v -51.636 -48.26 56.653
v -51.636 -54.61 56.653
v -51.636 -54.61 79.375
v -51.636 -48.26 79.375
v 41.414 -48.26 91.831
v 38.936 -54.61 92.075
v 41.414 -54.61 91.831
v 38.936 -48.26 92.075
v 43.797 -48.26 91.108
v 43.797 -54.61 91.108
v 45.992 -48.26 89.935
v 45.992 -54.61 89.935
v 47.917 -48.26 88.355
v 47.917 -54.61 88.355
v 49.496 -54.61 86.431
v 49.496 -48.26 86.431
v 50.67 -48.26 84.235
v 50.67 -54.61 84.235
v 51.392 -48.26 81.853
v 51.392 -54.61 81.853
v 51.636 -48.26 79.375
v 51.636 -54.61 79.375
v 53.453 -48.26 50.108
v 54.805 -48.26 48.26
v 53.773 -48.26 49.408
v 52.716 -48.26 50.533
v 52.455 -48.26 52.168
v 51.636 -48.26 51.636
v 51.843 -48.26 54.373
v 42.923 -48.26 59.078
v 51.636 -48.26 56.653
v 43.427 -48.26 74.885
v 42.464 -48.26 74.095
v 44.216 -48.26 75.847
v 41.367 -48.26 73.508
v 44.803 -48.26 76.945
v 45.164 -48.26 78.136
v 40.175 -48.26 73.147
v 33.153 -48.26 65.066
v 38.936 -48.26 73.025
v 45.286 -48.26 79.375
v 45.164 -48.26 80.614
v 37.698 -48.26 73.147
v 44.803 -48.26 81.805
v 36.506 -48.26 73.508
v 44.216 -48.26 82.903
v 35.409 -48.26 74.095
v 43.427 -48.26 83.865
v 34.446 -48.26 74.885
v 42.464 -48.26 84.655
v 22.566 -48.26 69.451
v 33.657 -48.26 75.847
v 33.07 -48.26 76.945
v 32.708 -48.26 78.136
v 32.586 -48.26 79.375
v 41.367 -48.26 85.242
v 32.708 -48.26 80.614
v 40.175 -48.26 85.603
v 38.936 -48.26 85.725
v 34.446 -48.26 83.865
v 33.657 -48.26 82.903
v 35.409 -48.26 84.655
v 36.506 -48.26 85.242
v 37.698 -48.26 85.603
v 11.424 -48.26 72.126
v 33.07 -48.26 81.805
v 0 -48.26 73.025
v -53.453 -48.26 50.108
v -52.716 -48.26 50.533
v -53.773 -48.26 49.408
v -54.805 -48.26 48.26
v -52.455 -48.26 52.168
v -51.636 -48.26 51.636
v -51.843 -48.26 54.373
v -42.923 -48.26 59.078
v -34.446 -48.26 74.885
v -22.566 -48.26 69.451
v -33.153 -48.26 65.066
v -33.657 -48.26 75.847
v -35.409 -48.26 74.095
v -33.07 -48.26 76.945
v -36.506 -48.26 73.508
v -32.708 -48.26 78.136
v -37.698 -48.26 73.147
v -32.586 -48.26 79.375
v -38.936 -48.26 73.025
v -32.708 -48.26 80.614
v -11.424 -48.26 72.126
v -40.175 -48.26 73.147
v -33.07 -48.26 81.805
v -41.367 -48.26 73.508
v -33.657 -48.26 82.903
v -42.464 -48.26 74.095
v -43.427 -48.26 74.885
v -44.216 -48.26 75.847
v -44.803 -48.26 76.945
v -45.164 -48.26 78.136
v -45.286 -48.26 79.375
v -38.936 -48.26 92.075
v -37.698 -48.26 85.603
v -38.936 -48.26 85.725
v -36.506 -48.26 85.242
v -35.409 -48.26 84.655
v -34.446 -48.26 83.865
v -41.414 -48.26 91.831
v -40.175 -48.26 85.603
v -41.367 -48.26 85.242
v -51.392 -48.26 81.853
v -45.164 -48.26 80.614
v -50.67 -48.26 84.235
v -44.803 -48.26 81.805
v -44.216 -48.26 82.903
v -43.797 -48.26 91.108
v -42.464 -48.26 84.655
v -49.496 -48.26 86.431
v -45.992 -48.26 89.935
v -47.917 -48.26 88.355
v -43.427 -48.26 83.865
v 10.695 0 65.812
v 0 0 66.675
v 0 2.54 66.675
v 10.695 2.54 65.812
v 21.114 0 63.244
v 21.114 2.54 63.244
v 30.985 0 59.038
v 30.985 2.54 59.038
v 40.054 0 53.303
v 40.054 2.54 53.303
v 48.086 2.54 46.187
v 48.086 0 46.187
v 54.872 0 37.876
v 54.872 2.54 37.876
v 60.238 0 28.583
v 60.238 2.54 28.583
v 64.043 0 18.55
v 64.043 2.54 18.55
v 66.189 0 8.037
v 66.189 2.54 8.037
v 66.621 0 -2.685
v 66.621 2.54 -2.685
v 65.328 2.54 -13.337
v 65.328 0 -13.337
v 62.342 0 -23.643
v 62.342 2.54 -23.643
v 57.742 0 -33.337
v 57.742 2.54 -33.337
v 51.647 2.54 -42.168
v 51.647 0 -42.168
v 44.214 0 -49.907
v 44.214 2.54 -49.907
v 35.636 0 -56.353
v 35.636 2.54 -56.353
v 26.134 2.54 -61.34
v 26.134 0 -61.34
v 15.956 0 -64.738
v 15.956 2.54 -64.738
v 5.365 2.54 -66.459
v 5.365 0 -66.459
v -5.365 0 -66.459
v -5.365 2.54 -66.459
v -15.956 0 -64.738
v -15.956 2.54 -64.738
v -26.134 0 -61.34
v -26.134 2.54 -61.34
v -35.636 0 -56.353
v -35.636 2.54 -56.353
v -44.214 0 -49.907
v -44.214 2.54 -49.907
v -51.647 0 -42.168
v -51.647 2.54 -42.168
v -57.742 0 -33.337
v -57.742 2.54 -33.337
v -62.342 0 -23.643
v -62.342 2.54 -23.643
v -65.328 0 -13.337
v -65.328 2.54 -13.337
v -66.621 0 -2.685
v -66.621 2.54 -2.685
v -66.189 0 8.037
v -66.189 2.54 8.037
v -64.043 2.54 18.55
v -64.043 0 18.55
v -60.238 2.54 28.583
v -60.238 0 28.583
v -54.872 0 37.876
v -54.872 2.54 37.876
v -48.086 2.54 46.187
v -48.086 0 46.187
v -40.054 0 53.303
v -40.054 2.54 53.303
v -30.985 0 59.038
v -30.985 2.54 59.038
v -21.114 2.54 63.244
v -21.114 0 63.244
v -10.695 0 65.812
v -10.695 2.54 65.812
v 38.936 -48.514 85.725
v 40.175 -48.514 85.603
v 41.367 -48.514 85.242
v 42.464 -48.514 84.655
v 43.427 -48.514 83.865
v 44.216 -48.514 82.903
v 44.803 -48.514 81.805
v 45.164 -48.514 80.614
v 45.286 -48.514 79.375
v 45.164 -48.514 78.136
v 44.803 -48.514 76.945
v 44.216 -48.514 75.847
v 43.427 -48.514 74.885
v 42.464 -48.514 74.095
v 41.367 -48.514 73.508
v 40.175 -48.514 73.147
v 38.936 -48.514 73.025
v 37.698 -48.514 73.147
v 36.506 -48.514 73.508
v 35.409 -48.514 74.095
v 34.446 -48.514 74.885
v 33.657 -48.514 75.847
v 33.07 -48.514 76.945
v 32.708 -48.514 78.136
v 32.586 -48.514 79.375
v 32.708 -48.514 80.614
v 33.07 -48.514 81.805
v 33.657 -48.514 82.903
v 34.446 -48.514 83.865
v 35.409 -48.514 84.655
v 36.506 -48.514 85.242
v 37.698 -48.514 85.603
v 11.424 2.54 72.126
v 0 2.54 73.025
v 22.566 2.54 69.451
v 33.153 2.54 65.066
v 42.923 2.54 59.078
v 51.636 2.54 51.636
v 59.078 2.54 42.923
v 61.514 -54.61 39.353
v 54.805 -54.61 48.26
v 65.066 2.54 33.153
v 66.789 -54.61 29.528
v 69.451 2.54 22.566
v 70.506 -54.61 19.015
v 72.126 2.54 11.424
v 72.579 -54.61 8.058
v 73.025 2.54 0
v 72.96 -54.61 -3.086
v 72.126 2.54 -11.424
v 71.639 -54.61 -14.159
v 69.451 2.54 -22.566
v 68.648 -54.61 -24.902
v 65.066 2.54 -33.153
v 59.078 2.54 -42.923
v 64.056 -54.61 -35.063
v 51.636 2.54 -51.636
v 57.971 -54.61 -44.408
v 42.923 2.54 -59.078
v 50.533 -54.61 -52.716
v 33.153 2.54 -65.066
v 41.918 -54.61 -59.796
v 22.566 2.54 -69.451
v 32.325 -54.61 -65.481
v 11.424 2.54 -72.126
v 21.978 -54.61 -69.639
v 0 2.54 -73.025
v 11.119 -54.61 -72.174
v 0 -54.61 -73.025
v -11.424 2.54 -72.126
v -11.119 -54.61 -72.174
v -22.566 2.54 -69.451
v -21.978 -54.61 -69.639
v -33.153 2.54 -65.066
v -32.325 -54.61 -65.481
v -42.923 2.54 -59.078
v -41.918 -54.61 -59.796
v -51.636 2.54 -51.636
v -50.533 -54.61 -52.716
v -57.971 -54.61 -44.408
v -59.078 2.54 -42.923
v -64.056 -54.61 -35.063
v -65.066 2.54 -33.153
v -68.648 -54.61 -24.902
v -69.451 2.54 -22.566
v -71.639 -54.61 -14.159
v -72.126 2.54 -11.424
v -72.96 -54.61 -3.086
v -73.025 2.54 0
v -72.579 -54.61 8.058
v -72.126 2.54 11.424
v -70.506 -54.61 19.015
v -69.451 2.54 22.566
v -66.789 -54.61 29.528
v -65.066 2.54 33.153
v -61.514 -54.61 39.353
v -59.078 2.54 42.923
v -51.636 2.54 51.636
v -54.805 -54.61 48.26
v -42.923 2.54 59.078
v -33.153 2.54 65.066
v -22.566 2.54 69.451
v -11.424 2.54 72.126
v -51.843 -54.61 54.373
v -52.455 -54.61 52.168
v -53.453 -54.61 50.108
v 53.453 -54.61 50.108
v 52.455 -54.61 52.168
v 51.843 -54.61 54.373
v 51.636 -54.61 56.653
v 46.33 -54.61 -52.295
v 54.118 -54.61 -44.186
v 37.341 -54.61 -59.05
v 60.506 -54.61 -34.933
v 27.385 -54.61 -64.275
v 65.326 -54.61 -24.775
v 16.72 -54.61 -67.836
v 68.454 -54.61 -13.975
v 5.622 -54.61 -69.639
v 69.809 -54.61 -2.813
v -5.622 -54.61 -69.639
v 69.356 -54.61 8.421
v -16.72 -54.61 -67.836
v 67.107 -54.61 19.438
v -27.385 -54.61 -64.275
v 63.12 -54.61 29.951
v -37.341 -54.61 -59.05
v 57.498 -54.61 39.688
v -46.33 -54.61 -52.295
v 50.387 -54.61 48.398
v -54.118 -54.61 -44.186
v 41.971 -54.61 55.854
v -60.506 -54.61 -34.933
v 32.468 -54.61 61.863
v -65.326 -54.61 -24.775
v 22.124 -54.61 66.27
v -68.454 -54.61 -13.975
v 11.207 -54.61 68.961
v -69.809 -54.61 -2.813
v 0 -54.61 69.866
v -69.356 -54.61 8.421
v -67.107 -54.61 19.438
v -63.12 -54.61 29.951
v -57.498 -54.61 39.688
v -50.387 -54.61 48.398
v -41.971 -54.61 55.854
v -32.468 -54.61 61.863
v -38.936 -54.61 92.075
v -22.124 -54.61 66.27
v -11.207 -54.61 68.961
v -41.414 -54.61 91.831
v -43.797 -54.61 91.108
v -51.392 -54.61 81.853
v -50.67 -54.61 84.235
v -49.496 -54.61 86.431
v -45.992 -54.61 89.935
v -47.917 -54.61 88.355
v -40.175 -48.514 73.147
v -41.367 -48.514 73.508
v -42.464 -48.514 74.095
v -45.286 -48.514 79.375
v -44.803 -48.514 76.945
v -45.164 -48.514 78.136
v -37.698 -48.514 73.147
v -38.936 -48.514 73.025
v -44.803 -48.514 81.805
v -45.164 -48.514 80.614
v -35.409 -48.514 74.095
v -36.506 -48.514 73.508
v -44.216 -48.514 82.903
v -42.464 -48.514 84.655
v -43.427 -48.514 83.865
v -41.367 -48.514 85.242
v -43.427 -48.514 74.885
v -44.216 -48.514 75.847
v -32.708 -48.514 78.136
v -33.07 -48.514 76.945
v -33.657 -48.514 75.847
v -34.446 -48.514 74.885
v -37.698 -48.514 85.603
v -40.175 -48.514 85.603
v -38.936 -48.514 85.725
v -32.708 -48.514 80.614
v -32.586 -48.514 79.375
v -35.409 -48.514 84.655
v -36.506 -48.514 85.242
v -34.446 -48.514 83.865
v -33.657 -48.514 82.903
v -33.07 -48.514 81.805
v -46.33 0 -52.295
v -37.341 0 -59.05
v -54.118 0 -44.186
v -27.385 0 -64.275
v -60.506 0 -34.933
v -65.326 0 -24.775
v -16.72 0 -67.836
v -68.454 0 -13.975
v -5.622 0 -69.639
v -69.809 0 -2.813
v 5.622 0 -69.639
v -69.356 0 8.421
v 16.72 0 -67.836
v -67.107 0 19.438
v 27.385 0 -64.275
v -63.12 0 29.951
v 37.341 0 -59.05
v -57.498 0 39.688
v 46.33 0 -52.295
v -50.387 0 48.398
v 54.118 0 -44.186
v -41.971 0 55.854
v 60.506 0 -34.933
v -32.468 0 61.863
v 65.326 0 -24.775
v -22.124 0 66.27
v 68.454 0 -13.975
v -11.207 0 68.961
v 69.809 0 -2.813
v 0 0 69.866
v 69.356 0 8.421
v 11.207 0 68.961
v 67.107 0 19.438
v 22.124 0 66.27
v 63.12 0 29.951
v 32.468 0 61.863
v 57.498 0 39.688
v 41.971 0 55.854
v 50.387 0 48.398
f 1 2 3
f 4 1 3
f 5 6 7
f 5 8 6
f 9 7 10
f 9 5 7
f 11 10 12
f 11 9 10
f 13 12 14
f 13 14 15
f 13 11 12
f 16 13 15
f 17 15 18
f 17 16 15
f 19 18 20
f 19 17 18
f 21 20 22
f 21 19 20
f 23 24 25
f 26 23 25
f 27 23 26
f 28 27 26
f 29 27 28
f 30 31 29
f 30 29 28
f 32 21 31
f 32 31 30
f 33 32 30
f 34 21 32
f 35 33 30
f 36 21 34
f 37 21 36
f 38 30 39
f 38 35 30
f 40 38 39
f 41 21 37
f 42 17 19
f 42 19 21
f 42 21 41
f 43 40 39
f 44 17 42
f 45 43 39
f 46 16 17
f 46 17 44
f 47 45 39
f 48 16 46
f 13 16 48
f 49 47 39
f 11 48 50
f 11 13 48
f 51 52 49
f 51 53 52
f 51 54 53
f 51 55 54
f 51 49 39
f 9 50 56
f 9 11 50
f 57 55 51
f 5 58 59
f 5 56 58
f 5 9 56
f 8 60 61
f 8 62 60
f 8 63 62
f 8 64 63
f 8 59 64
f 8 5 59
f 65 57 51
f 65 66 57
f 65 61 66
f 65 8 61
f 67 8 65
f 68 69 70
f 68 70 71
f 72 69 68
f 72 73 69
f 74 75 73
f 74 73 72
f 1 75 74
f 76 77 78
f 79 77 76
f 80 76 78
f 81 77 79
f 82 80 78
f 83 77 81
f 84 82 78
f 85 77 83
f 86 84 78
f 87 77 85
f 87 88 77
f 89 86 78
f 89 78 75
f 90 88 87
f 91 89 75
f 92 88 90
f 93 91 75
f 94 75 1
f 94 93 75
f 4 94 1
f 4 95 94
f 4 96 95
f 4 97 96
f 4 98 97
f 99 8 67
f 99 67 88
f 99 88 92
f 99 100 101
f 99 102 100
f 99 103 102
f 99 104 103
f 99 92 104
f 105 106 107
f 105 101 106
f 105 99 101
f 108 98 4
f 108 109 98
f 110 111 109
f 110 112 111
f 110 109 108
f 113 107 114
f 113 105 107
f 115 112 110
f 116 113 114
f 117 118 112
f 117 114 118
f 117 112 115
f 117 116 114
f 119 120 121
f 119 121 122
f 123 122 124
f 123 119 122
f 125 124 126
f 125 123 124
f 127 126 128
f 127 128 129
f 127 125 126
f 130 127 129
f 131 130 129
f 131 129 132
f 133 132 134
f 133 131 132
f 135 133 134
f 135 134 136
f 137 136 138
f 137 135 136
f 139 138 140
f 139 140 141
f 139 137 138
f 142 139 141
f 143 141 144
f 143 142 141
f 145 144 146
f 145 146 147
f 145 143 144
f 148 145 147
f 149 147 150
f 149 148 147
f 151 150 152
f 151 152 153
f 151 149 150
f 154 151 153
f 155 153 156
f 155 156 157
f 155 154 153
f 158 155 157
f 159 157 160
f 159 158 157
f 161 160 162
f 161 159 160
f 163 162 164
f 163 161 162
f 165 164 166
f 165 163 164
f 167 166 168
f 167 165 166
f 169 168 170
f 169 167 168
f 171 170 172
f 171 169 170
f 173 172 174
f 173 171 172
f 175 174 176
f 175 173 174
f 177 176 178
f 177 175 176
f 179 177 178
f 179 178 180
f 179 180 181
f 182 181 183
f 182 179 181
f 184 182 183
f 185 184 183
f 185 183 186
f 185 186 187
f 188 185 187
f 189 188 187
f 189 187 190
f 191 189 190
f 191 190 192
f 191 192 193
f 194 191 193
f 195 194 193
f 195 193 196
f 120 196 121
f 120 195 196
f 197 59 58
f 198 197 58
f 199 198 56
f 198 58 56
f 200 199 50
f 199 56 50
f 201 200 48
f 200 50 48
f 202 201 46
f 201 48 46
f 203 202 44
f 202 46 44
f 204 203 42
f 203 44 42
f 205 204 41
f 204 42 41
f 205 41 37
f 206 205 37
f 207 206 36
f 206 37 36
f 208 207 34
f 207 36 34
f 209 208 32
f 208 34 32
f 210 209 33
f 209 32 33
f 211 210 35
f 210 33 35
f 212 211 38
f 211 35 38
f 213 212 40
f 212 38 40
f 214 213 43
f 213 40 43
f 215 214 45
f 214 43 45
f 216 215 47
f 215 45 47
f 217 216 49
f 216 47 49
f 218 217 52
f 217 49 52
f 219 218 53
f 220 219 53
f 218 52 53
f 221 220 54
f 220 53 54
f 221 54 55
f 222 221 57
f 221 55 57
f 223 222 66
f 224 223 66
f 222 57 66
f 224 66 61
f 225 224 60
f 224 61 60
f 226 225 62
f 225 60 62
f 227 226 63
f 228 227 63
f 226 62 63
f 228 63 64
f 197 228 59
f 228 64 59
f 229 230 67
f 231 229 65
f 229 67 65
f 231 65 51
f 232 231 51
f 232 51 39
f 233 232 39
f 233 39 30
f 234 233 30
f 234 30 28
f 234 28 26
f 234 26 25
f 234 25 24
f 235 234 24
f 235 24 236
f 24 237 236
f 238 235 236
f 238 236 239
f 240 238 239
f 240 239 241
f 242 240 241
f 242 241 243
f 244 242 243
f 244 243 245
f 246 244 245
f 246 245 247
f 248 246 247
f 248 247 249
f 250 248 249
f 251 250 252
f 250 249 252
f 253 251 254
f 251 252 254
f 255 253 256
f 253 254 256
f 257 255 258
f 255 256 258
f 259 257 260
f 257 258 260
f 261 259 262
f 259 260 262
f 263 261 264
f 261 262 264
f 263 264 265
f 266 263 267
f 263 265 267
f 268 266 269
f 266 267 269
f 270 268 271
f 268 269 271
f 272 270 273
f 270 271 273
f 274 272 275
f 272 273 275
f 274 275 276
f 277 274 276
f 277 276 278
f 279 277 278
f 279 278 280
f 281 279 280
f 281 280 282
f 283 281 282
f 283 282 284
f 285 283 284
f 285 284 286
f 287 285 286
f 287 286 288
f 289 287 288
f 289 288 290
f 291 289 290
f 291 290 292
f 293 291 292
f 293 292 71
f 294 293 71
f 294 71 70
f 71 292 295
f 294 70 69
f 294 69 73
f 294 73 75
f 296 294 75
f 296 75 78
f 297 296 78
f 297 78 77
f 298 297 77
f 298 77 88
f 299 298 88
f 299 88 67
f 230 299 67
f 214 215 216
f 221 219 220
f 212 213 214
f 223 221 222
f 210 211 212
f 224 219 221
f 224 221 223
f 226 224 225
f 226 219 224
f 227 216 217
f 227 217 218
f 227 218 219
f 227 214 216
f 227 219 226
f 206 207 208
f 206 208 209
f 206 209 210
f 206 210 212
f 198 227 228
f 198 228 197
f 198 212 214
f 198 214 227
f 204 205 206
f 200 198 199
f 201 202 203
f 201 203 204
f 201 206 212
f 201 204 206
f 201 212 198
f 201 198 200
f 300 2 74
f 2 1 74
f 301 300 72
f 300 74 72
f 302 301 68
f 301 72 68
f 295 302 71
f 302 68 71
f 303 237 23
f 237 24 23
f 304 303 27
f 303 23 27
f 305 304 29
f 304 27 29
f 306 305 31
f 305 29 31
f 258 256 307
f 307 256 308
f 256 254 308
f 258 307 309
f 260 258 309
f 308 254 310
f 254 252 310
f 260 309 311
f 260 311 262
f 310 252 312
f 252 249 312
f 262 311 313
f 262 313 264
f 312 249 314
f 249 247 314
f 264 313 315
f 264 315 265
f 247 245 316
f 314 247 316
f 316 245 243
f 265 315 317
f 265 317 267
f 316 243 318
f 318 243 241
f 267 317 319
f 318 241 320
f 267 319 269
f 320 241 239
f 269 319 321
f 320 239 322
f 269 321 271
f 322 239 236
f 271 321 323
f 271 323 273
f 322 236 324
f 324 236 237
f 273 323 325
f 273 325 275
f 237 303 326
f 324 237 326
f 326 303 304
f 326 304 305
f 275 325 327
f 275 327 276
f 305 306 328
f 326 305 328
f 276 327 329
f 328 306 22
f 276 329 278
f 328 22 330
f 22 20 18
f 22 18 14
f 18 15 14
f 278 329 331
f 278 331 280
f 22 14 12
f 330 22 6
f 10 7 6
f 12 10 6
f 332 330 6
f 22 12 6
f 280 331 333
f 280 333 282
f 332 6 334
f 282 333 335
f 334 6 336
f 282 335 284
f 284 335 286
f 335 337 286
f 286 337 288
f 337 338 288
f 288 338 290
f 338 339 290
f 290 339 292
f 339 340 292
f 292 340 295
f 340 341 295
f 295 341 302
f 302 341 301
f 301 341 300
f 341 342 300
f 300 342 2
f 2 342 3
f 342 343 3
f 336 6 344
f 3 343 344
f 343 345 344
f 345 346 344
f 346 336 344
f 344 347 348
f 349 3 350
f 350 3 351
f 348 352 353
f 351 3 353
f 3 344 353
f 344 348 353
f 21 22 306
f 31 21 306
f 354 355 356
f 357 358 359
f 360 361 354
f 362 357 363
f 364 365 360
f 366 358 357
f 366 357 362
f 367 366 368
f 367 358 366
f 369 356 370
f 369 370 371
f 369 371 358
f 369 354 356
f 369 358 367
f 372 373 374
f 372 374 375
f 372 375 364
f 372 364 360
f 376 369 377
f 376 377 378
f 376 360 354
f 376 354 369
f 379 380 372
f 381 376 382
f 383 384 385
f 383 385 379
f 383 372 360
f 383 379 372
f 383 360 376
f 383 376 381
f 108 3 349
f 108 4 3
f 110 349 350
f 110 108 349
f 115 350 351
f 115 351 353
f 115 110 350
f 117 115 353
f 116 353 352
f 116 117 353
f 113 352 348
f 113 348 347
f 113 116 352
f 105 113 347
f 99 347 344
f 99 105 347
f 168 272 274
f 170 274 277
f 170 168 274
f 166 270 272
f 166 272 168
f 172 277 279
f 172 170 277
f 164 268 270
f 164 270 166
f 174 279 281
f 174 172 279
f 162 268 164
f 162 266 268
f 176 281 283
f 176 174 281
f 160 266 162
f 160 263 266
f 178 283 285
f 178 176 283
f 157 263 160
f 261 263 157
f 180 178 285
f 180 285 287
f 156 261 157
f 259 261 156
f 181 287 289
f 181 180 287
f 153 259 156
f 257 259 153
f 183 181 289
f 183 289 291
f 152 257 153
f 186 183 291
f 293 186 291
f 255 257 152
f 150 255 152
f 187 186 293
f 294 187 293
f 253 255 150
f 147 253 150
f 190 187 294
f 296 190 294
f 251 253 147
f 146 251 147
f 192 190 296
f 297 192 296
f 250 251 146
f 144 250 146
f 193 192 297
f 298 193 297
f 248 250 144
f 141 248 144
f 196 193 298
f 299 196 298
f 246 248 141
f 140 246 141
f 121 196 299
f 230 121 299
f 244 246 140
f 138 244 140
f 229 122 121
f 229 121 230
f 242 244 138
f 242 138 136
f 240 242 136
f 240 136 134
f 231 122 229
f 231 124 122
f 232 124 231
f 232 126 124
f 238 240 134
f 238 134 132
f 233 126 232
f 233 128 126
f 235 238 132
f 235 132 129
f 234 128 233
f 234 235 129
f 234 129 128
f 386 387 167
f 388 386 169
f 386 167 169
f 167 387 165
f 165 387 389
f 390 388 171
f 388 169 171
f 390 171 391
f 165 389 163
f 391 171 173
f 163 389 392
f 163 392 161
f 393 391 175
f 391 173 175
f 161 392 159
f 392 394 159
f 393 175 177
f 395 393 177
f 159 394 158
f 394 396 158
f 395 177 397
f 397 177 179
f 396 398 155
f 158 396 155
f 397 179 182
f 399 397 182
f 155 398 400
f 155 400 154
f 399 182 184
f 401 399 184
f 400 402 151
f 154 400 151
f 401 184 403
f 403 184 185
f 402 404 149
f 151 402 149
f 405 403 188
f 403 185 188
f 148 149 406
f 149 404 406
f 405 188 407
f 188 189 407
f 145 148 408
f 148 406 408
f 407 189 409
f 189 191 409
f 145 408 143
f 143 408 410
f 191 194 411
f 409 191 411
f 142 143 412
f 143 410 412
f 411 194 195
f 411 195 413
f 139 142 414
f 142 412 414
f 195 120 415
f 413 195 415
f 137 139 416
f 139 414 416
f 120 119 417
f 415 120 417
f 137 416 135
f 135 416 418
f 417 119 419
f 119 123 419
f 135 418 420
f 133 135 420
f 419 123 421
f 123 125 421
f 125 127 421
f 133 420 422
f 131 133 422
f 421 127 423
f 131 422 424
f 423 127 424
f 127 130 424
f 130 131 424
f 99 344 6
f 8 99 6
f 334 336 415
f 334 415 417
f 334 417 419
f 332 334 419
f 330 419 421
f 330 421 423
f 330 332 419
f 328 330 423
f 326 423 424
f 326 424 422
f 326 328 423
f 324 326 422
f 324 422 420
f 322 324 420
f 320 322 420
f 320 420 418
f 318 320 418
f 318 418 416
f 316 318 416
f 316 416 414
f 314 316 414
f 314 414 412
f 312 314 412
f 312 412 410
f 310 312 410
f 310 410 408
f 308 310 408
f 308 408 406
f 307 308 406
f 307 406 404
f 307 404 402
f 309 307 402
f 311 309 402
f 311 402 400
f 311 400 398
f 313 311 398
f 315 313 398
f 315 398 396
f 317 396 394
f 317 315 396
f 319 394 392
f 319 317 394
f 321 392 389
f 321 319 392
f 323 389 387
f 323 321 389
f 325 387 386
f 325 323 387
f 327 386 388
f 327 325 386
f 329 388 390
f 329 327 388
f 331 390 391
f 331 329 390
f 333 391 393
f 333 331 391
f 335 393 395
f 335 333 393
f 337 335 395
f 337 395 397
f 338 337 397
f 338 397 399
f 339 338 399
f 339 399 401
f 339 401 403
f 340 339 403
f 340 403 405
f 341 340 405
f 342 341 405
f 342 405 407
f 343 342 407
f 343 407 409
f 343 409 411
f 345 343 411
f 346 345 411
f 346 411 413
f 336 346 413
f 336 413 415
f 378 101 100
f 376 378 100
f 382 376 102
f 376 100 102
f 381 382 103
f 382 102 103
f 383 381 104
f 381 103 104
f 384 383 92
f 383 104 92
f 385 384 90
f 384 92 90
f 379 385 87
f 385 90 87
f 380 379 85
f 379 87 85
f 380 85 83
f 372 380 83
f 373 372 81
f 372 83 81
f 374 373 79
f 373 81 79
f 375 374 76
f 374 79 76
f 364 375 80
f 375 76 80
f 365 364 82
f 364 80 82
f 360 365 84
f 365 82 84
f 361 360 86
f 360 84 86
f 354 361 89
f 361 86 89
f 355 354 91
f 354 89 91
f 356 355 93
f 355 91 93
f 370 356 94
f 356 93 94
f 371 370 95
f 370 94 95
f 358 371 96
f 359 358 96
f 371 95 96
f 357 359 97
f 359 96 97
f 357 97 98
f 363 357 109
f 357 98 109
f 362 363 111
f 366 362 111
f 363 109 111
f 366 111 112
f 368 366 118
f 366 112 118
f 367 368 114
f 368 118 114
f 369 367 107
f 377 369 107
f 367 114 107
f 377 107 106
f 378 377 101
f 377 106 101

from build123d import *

# Parameters (mm, degrees)
SKETCH1_R           = 69.865875
SKETCH1_R_2         = 66.675
BOSS_EXTRUDE1_DEPTH = 2.54
BOSS_EXTRUDE2_START = -57.15
SKETCH2_R           = 73.025
SKETCH2_R_2         = 69.865875
BOSS_EXTRUDE2_DEPTH = 57.15
BOSS_EXTRUDE3_DEPTH = 6.35
FILLET2_R           = 12.7
SKETCH4_R           = 6.35
CUT_EXTRUDE1_DEPTH  = 0.254


with BuildPart() as part:
    # Sketch1 → Boss-Extrude1 (new body)
    with BuildSketch(Plane(origin=(0, 0, 0), x_dir=(1, 0, 0), z_dir=(0, 1, 0))):
        with Locations(Location((0, 0, 0), (0, 0, 270))):
            Circle(SKETCH1_R)
        with Locations(Location((0, 0, 0), (0, 0, 270))):
            Circle(SKETCH1_R_2, mode=Mode.SUBTRACT)
    extrude(amount=BOSS_EXTRUDE1_DEPTH)

    # Sketch2 → Boss-Extrude2 (add)
    with BuildSketch(Plane(origin=(0, 2.54, 0), x_dir=(1, 0, 0), z_dir=(0, 1, 0)).offset(BOSS_EXTRUDE2_START)):
        with Locations(Location((0, 0, 0), (0, 0, 270))):
            Circle(SKETCH2_R)
        with Locations(Location((0, 0, 0), (0, 0, 270))):
            Circle(SKETCH2_R_2, mode=Mode.SUBTRACT)
    extrude(amount=BOSS_EXTRUDE2_DEPTH)

    # Sketch3 → Boss-Extrude3 (add)
    with BuildSketch(Plane.XZ.offset(54.61)):
        with BuildLine():
            Line((-51.636472696, 51.636472696), (-51.636472696, 92.075))
            Line((-51.636472696, 92.075), (51.636472696, 92.075))
            Line((51.636472696, 92.075), (51.636472696, 51.636472696))
            ThreePointArc((51.636472696, 51.636472696), (0, 73.025), (-51.636472696, 51.636472696))
        make_face()
    extrude(amount=-BOSS_EXTRUDE3_DEPTH)

    # Fillet2
    fillet2_edges = [part.edges().sort_by_distance(p)[0] for p in [
        (51.636472696, -51.435, 51.636472696),
        (-51.636472696, -51.435, 51.636472696),
        (-51.636472696, -51.435, 92.075),
        (51.636472696, -51.435, 92.075),
    ]]
    fillet(fillet2_edges, radius=FILLET2_R)

    # Sketch4 → Cut-Extrude1 (cut)
    with BuildSketch(Plane(origin=(0, -48.26, 0), x_dir=(1, 0, 0), z_dir=(0, 1, 0))):
        with Locations(Location((-38.936472696, -79.375, 0), (0, 0, 270))):
            Circle(SKETCH4_R)
        with Locations(Location((38.936472696, -79.375, 0), (0, 0, 270))):
            Circle(SKETCH4_R)
    extrude(amount=-CUT_EXTRUDE1_DEPTH, mode=Mode.SUBTRACT)


solid = part.part
